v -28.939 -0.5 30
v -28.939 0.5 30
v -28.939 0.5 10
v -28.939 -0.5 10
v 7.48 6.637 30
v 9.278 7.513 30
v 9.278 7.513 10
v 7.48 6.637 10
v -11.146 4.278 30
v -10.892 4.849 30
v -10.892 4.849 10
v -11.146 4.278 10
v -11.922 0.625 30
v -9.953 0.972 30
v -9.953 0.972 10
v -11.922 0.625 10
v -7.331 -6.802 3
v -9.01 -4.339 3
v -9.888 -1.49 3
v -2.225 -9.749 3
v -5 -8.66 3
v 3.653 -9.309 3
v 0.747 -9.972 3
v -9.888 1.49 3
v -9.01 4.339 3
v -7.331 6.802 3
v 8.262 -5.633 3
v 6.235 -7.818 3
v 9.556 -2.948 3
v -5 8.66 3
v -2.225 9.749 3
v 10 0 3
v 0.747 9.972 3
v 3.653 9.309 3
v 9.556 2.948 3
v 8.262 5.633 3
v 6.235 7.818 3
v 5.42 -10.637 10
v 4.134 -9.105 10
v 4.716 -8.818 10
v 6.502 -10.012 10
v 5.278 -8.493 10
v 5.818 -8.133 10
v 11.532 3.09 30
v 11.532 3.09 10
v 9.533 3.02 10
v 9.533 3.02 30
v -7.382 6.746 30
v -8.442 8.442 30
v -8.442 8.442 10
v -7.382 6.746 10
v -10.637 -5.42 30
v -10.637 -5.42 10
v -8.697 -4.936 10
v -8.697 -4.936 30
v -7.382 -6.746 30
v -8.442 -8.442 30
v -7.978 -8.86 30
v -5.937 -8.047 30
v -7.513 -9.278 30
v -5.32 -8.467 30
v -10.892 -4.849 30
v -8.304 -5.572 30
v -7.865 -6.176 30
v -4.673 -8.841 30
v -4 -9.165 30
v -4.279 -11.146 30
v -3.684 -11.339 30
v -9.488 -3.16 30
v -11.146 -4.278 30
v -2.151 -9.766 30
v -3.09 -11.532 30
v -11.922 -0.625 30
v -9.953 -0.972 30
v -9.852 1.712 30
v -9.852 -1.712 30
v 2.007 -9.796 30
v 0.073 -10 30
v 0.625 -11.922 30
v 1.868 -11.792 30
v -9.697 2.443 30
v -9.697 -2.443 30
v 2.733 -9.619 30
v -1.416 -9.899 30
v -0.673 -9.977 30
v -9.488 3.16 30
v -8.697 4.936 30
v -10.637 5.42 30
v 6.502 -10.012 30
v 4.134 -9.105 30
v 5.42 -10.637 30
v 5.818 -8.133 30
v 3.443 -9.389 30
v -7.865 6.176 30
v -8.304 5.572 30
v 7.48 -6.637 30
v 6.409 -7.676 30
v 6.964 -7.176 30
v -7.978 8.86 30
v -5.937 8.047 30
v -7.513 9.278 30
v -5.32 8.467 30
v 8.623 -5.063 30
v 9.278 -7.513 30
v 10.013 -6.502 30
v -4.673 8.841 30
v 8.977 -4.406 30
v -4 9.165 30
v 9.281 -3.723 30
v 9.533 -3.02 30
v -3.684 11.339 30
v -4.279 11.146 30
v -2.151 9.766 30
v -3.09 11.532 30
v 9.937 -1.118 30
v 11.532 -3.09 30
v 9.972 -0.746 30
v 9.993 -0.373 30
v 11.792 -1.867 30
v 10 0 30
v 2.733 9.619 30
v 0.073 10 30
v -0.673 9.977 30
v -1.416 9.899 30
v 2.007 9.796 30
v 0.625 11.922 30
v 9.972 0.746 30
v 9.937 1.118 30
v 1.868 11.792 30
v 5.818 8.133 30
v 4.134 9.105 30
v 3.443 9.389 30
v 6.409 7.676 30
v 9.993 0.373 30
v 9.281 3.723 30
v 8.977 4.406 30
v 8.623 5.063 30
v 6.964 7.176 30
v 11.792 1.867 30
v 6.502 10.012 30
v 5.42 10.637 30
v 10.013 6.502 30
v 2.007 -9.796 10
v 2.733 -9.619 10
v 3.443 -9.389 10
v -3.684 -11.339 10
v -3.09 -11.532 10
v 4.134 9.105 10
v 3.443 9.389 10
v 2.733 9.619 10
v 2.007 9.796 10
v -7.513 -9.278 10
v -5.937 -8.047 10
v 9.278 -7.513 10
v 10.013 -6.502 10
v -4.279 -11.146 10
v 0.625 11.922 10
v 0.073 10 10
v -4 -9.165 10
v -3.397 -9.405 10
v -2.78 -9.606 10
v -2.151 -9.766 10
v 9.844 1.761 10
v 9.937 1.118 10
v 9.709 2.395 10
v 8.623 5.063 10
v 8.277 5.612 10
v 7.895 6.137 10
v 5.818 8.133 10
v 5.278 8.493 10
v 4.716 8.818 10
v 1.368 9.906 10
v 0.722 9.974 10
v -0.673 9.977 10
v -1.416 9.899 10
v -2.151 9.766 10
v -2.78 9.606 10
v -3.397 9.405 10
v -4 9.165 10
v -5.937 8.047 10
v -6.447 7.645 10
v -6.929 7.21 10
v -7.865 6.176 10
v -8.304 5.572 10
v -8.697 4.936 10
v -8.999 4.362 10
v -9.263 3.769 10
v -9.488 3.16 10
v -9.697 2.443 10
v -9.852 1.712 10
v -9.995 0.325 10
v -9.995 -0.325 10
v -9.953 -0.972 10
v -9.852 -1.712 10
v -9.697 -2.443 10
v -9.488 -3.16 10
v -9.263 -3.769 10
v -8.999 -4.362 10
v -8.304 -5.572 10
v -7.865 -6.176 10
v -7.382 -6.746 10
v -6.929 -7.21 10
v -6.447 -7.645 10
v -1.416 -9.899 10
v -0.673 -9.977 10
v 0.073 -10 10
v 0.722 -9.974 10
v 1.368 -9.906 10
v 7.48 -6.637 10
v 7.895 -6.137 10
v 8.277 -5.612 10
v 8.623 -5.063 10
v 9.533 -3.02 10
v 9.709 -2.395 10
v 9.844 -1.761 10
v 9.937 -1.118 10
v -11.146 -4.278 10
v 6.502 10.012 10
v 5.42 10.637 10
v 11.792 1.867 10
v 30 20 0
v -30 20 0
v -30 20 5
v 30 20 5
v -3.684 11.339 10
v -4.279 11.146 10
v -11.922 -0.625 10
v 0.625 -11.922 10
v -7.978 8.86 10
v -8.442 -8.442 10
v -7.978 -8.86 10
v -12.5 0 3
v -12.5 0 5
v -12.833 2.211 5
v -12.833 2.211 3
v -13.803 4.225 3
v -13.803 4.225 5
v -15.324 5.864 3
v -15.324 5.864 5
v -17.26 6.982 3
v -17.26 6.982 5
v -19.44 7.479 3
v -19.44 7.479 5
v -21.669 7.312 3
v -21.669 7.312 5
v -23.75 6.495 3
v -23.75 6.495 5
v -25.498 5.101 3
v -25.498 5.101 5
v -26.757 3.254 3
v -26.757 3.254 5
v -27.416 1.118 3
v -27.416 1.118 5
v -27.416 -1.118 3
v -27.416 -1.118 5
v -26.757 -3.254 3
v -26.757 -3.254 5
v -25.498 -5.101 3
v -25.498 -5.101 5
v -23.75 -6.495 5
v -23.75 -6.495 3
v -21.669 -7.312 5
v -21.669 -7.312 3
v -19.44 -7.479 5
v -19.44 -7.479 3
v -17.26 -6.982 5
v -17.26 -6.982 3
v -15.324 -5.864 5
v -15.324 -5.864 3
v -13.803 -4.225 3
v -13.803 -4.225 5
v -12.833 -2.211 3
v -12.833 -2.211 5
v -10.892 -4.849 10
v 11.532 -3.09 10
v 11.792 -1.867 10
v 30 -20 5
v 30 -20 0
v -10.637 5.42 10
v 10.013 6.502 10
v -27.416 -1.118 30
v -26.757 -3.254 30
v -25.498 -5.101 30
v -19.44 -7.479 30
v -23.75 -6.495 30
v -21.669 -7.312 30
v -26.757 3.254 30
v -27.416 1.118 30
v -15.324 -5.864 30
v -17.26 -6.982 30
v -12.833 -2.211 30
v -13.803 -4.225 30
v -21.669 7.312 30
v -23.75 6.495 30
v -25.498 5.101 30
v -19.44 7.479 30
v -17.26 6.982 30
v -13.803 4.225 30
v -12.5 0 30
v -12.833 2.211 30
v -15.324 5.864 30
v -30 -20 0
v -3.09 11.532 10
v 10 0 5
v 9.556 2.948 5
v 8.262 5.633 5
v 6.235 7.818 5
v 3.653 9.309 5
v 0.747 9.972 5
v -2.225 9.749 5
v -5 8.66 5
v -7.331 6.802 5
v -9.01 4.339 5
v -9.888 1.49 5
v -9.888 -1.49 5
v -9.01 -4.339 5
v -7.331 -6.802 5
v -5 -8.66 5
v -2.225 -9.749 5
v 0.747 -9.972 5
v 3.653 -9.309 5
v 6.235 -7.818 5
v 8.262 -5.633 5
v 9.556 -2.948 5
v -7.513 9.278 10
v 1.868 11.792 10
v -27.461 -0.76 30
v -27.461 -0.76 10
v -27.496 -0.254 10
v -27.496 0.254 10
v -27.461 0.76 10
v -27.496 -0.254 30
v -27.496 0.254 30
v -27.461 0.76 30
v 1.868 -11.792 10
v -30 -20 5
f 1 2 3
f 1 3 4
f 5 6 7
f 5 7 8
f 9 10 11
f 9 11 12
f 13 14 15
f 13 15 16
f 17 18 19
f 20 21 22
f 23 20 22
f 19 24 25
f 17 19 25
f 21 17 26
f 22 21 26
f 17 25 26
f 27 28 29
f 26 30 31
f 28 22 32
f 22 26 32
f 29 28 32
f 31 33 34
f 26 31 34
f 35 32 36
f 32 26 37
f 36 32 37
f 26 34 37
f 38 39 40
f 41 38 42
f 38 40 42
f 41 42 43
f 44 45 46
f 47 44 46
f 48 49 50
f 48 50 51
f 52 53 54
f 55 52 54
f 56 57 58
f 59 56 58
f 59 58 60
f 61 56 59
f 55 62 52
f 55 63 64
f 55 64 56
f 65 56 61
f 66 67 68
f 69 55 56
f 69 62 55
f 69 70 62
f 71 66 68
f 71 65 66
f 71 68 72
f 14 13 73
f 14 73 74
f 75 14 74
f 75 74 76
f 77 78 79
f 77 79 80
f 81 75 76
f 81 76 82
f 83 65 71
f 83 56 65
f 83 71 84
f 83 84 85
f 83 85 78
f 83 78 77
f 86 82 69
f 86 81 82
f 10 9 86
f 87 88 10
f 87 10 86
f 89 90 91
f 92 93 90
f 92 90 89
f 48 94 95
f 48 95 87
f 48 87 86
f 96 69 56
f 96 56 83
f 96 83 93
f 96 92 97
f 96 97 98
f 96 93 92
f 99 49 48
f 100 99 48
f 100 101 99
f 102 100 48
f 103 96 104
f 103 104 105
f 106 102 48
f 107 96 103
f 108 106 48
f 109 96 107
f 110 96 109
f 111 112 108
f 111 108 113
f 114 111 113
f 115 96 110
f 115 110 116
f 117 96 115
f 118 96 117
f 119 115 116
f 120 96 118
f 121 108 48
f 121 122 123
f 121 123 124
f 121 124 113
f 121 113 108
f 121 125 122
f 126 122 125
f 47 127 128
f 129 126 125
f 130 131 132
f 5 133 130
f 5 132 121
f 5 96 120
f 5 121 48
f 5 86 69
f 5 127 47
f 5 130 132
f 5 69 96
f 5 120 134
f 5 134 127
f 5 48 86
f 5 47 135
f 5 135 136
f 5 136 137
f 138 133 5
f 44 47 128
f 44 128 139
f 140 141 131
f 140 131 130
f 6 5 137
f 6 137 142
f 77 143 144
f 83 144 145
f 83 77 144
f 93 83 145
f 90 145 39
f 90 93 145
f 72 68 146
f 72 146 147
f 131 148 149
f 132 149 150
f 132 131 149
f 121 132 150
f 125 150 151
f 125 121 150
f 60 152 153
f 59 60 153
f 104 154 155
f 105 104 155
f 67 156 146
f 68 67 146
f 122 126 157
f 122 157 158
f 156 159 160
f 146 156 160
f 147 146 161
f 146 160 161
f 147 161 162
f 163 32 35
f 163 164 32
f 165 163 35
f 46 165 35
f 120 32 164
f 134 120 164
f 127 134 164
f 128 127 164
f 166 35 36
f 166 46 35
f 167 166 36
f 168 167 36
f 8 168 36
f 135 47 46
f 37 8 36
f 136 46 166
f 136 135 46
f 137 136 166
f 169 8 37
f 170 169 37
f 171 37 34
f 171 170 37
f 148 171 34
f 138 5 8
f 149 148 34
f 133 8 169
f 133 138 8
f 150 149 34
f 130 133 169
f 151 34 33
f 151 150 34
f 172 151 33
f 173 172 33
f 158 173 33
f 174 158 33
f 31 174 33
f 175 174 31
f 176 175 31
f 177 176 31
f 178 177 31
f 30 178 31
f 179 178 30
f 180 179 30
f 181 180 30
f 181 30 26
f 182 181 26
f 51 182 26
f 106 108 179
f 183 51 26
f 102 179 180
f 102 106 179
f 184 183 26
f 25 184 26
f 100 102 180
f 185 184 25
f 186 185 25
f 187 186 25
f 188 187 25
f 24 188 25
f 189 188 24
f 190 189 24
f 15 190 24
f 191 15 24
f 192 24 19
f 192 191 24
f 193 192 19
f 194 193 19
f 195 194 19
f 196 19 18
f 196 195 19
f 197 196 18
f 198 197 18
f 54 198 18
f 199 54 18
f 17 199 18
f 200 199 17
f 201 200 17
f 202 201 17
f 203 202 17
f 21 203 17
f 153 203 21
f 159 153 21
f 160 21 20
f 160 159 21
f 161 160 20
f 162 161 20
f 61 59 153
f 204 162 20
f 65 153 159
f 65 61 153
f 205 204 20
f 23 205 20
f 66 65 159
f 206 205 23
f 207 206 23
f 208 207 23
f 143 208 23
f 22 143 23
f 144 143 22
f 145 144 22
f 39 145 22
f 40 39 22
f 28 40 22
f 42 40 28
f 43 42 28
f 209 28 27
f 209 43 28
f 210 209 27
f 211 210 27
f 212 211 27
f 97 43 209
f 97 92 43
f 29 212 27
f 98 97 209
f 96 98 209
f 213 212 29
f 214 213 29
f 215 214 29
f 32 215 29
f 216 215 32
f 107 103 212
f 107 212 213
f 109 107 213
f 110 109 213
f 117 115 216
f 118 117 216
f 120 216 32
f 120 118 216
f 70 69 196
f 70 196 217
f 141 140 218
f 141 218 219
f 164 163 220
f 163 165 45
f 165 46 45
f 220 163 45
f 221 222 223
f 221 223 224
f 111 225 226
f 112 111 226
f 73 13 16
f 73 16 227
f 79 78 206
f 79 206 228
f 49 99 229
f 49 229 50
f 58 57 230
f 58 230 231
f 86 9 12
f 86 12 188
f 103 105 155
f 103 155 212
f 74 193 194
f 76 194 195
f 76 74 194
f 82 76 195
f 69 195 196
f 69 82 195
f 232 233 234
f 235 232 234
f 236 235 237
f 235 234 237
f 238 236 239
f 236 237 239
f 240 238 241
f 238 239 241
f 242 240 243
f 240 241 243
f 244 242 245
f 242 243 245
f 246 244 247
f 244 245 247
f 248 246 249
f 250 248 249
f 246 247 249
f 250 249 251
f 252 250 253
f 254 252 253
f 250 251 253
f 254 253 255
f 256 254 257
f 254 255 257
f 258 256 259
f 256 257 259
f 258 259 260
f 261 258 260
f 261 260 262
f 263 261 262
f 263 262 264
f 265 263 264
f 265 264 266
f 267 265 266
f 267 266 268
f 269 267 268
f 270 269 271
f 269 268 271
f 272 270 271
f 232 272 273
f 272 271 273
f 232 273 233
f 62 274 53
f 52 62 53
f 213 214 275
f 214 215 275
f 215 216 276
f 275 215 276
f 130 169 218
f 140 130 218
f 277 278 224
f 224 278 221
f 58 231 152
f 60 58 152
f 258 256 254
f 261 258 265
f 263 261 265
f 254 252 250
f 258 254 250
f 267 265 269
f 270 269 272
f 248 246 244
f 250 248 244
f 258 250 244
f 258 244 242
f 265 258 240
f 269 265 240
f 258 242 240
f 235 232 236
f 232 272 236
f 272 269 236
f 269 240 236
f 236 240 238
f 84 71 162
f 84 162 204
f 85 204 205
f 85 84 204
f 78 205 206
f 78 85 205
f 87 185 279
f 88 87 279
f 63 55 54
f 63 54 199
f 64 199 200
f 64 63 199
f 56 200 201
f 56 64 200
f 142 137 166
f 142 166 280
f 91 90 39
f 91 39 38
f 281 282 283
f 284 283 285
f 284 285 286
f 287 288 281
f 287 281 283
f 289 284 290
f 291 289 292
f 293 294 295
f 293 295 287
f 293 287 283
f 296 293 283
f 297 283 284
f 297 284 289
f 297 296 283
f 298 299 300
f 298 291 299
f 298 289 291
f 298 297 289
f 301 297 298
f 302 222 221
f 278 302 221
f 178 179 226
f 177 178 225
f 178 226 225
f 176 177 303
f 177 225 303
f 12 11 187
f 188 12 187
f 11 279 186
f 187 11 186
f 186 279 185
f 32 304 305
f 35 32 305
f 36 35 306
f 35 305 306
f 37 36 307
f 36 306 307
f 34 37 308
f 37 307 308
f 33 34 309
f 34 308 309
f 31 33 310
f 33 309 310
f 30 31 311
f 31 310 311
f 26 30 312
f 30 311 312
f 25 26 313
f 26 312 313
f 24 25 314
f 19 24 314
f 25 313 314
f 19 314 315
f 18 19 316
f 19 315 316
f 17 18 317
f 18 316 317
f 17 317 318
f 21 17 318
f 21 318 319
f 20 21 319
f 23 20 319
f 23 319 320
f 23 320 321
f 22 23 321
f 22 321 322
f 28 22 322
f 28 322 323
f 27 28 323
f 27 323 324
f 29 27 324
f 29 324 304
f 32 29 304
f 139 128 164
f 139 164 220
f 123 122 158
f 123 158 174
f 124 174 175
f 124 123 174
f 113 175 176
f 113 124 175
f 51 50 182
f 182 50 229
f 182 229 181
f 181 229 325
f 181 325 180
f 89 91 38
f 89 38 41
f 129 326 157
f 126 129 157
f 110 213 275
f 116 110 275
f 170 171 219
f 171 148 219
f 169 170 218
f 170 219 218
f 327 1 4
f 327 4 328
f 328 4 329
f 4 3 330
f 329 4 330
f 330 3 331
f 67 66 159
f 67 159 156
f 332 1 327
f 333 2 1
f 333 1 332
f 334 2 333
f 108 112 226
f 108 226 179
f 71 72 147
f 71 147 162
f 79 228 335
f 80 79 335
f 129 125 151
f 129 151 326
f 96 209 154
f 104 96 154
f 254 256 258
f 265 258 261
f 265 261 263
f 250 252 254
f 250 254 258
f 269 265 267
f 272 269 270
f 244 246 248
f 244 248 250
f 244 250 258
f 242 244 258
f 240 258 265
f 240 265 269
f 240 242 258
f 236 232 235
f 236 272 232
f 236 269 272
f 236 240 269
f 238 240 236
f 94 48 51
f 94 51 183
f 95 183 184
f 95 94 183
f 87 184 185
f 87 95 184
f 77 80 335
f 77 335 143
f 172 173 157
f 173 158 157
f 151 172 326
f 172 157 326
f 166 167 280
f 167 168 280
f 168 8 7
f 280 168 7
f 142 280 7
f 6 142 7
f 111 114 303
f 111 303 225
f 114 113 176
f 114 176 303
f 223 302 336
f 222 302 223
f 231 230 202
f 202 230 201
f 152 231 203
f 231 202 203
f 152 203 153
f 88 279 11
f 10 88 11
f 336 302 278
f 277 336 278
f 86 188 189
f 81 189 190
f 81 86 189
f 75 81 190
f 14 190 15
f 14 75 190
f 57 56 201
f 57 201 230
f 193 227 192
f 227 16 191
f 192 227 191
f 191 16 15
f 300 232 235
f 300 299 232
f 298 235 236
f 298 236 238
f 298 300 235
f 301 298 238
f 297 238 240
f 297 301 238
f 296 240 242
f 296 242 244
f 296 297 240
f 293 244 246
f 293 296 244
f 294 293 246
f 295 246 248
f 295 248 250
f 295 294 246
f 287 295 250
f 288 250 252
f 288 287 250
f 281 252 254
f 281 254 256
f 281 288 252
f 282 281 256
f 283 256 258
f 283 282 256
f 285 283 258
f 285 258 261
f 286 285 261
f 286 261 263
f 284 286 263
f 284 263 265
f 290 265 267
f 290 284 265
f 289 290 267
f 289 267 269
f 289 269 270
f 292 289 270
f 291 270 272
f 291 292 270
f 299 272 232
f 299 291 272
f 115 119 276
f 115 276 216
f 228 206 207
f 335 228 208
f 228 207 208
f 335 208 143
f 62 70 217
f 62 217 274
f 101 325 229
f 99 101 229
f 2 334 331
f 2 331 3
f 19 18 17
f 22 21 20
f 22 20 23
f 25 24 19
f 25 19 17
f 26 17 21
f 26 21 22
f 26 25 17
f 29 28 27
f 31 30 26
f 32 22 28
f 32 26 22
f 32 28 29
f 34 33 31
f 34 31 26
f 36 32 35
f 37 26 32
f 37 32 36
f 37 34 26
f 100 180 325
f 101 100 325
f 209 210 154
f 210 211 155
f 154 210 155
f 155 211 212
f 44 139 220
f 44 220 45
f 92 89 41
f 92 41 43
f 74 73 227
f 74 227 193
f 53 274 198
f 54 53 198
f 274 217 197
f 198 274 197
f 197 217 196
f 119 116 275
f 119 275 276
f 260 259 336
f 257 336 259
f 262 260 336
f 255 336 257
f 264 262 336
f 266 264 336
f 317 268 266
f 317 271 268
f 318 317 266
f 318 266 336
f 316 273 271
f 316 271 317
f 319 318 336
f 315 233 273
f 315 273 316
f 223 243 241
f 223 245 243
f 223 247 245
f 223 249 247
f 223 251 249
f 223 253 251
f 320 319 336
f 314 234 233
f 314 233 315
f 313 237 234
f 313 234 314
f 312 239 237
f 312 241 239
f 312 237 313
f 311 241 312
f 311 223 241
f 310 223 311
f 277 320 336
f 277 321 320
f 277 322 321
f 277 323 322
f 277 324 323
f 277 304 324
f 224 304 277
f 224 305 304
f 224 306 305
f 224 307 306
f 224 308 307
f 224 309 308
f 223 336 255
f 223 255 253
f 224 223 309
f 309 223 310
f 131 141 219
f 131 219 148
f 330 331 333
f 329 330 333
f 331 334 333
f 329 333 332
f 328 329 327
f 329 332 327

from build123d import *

# Parameters (mm, degrees)
F0_W          = 60
F0_H          = 40
F1_DEPTH      = 5
F2_R          = 7.5
F3_DEPTH      = 25
F3_DEPTH_BACK = 2
F5_R          = 10
F6_DEPTH      = 25
F6_DEPTH_BACK = 2
F9_DEPTH      = 20
F12_DEPTH     = 20


with BuildPart() as f1:
    # F0 (on Top) → F1 (new body)
    with BuildSketch(Plane.XY):
        Rectangle(F0_W, F0_H)
    extrude(amount=F1_DEPTH)


with BuildPart() as f3:
    # F2 (on face) → F3 (new body, two sides)
    with BuildSketch(Plane.XY.offset(5)) as f3_sk:
        with Locations((-20, 0)):
            Circle(F2_R)
    extrude(amount=F3_DEPTH)
    extrude(f3_sk.sketch, amount=-F3_DEPTH_BACK)


with BuildPart() as f1_1:
    add(f1.part)

    # F4: cut F3
    add(f3.part, mode=Mode.SUBTRACT)


with BuildPart() as f6:
    # F5 (on face) → F6 (new body, two sides)
    with BuildSketch(Plane.XY.offset(5)) as f6_sk:
        Circle(F5_R)
    extrude(amount=F6_DEPTH)
    extrude(f6_sk.sketch, amount=-F6_DEPTH_BACK)

    # F11 (on face) → F12 (join)
    with BuildSketch(Plane.XY.offset(30)):
        with BuildLine():
            ThreePointArc((9.937283, -1.118217), (9.984308, -0.559987), (10, 0))
            ThreePointArc((10, 0), (9.984308, 0.559987), (9.937283, 1.118217))
            ThreePointArc((9.937283, 1.118217), (9.781476, 2.079117), (9.532979, 3.020315))
            ThreePointArc((9.532979, 3.020315), (9.135455, 4.067366), (8.62334, 5.063399))
            ThreePointArc((8.62334, 5.063399), (8.09017, 5.877853), (7.480337, 6.636607))
            ThreePointArc((7.480337, 6.636607), (6.691306, 7.431448), (5.818343, 8.133073))
            ThreePointArc((5.818343, 8.133073), (5, 8.660254), (4.134277, 9.10537))
            ThreePointArc((4.134277, 9.10537), (3.09017, 9.510565), (2.007302, 9.796466))
            ThreePointArc((2.007302, 9.796466), (1.045285, 9.945219), (0.073362, 9.999731))
            ThreePointArc((0.073362, 9.999731), (-1.045285, 9.945219), (-2.15082, 9.76596))
            ThreePointArc((-2.15082, 9.76596), (-3.09017, 9.510565), (-4.000237, 9.165048))
            ThreePointArc((-4.000237, 9.165048), (-5, 8.660254), (-5.937045, 8.046831))
            ThreePointArc((-5.937045, 8.046831), (-6.691306, 7.431448), (-7.382159, 6.745645))
            ThreePointArc((-7.382159, 6.745645), (-8.09017, 5.877853), (-8.696702, 4.936332))
            ThreePointArc((-8.696702, 4.936332), (-9.135455, 4.067366), (-9.487639, 3.159858))
            ThreePointArc((-9.487639, 3.159858), (-9.781476, 2.079117), (-9.95262, 0.972296))
            ThreePointArc((-9.95262, 0.972296), (-10, 0), (-9.95262, -0.972296))
            ThreePointArc((-9.95262, -0.972296), (-9.781476, -2.079117), (-9.487639, -3.159858))
            ThreePointArc((-9.487639, -3.159858), (-9.135455, -4.067366), (-8.696702, -4.936332))
            ThreePointArc((-8.696702, -4.936332), (-8.09017, -5.877853), (-7.382159, -6.745645))
            ThreePointArc((-7.382159, -6.745645), (-6.691306, -7.431448), (-5.937045, -8.046831))
            ThreePointArc((-5.937045, -8.046831), (-5, -8.660254), (-4.000237, -9.165048))
            ThreePointArc((-4.000237, -9.165048), (-3.09017, -9.510565), (-2.15082, -9.76596))
            ThreePointArc((-2.15082, -9.76596), (-1.045285, -9.945219), (0.073362, -9.999731))
            ThreePointArc((0.073362, -9.999731), (1.045285, -9.945219), (2.007302, -9.796466))
            ThreePointArc((2.007302, -9.796466), (3.09017, -9.510565), (4.134277, -9.10537))
            ThreePointArc((4.134277, -9.10537), (5, -8.660254), (5.818343, -8.133073))
            ThreePointArc((5.818343, -8.133073), (6.691306, -7.431448), (7.480337, -6.636607))
            ThreePointArc((7.480337, -6.636607), (8.09017, -5.877853), (8.62334, -5.063399))
            ThreePointArc((8.62334, -5.063399), (9.135455, -4.067366), (9.532979, -3.020315))
            ThreePointArc((9.532979, -3.020315), (9.781476, -2.079117), (9.937283, -1.118217))
        make_face()
        with BuildLine():
            ThreePointArc((9.532979, 3.020315), (9.781476, 2.079117), (9.937283, 1.118217))
            Line((9.937283, 1.118217), (11.791651, 1.86743))
            Line((11.791651, 1.86743), (11.661706, 2.478772))
            Line((11.661706, 2.478772), (11.531761, 3.090114))
            Line((11.531761, 3.090114), (9.532979, 3.020315))
        make_face()
        with BuildLine():
            Line((11.791651, -1.86743), (9.937283, -1.118217))
            ThreePointArc((9.937283, -1.118217), (9.781476, -2.079117), (9.532979, -3.020315))
            Line((9.532979, -3.020315), (11.531761, -3.090114))
            Line((11.531761, -3.090114), (11.661706, -2.478772))
            Line((11.661706, -2.478772), (11.791651, -1.86743))
        make_face()
        with BuildLine():
            ThreePointArc((7.480337, 6.636607), (8.09017, 5.877853), (8.62334, 5.063399))
            Line((8.62334, 5.063399), (10.012657, 6.502078))
            Line((10.012657, 6.502078), (9.645291, 7.007714))
            Line((9.645291, 7.007714), (9.277925, 7.51335))
            Line((9.277925, 7.51335), (7.480337, 6.636607))
        make_face()
        with BuildLine():
            Line((10.012657, -6.502078), (8.62334, -5.063399))
            ThreePointArc((8.62334, -5.063399), (8.09017, -5.877853), (7.480337, -6.636607))
            Line((7.480337, -6.636607), (9.277925, -7.51335))
            Line((9.277925, -7.51335), (9.645291, -7.007714))
            Line((9.645291, -7.007714), (10.012657, -6.502078))
        make_face()
        with BuildLine():
            ThreePointArc((4.134277, 9.10537), (5, 8.660254), (5.818343, 8.133073))
            Line((5.818343, 8.133073), (6.502384, 10.012459))
            Line((6.502384, 10.012459), (5.961118, 10.324959))
            Line((5.961118, 10.324959), (5.419852, 10.637459))
            Line((5.419852, 10.637459), (4.134277, 9.10537))
        make_face()
        with BuildLine():
            Line((6.502384, -10.012459), (5.818343, -8.133073))
            ThreePointArc((5.818343, -8.133073), (5, -8.660254), (4.134277, -9.10537))
            Line((4.134277, -9.10537), (5.419852, -10.637459))
            Line((5.419852, -10.637459), (5.961118, -10.324959))
            Line((5.961118, -10.324959), (6.502384, -10.012459))
        make_face()
        with BuildLine():
            ThreePointArc((0.073362, 9.999731), (1.045285, 9.945219), (2.007302, 9.796466))
            Line((2.007302, 9.796466), (1.867789, 11.791594))
            Line((1.867789, 11.791594), (1.246213, 11.856924))
            Line((1.246213, 11.856924), (0.624637, 11.922254))
            Line((0.624637, 11.922254), (0.073362, 9.999731))
        make_face()
        with BuildLine():
            Line((1.867789, -11.791594), (2.007302, -9.796466))
            ThreePointArc((2.007302, -9.796466), (1.045285, -9.945219), (0.073362, -9.999731))
            Line((0.073362, -9.999731), (0.624637, -11.922254))
            Line((0.624637, -11.922254), (1.246213, -11.856924))
            Line((1.246213, -11.856924), (1.867789, -11.791594))
        make_face()
        with BuildLine():
            ThreePointArc((-4.000237, 9.165048), (-3.09017, 9.510565), (-2.15082, 9.76596))
            Line((-2.15082, 9.76596), (-3.089763, 11.531855))
            Line((-3.089763, 11.531855), (-3.684173, 11.33872))
            Line((-3.684173, 11.33872), (-4.278584, 11.145584))
            Line((-4.278584, 11.145584), (-4.000237, 9.165048))
        make_face()
        with BuildLine():
            Line((-3.089763, -11.531855), (-2.15082, -9.76596))
            ThreePointArc((-2.15082, -9.76596), (-3.09017, -9.510565), (-4.000237, -9.165048))
            Line((-4.000237, -9.165048), (-4.278584, -11.145584))
            Line((-4.278584, -11.145584), (-3.684173, -11.33872))
            Line((-3.684173, -11.33872), (-3.089763, -11.531855))
        make_face()
        with BuildLine():
            ThreePointArc((-7.382159, 6.745645), (-6.691306, 7.431448), (-5.937045, 8.046831))
            Line((-5.937045, 8.046831), (-7.513067, 9.278154))
            Line((-7.513067, 9.278154), (-7.977533, 8.859947))
            Line((-7.977533, 8.859947), (-8.441998, 8.441741))
            Line((-8.441998, 8.441741), (-7.382159, 6.745645))
        make_face()
        with BuildLine():
            Line((-7.513067, -9.278154), (-5.937045, -8.046831))
            ThreePointArc((-5.937045, -8.046831), (-6.691306, -7.431448), (-7.382159, -6.745645))
            Line((-7.382159, -6.745645), (-8.441998, -8.441741))
            Line((-8.441998, -8.441741), (-7.977533, -8.859947))
            Line((-7.977533, -8.859947), (-7.513067, -9.278154))
        make_face()
        with BuildLine():
            ThreePointArc((-9.487639, 3.159858), (-9.135455, 4.067366), (-8.696702, 4.936332))
            Line((-8.696702, 4.936332), (-10.637293, 5.420176))
            Line((-10.637293, 5.420176), (-10.891504, 4.84921))
            Line((-10.891504, 4.84921), (-11.145714, 4.278244))
            Line((-11.145714, 4.278244), (-9.487639, 3.159858))
        make_face()
        with BuildLine():
            Line((-10.637293, -5.420176), (-8.696702, -4.936332))
            ThreePointArc((-8.696702, -4.936332), (-9.135455, -4.067366), (-9.487639, -3.159858))
            Line((-9.487639, -3.159858), (-11.145714, -4.278244))
            Line((-11.145714, -4.278244), (-10.891504, -4.84921))
            Line((-10.891504, -4.84921), (-10.637293, -5.420176))
        make_face()
        with BuildLine():
            ThreePointArc((-9.95262, -0.972296), (-10, 0), (-9.95262, 0.972296))
            Line((-9.95262, 0.972296), (-11.922235, 0.625))
            Line((-11.922235, 0.625), (-11.922235, 0))
            Line((-11.922235, 0), (-11.922235, -0.625))
            Line((-11.922235, -0.625), (-9.95262, -0.972296))
        make_face()
    extrude(amount=-F12_DEPTH)


with BuildPart() as f1_2:
    add(f1_1.part)

    # F7: cut F6
    add(f6.part, mode=Mode.SUBTRACT)


with BuildPart() as f9:
    # F8 (on face) → F9 (new body)
    with BuildSketch(Plane.XY.offset(30)):
        with BuildLine():
            ThreePointArc((-27.461346, -0.760472), (-27.5, 0), (-27.461346, 0.760472))
            Line((-27.461346, 0.760472), (-28.938557, 0.5))
            Line((-28.938557, 0.5), (-28.938557, 0))
            Line((-28.938557, 0), (-28.938557, -0.5))
            Line((-28.938557, -0.5), (-27.461346, -0.760472))
        make_face()
        with BuildLine():
            ThreePointArc((-12.5, 0), (-19.619273, 7.49033), (-27.461346, 0.760472))
            ThreePointArc((-27.461346, 0.760472), (-27.5, 0), (-27.461346, -0.760472))
            ThreePointArc((-27.461346, -0.760472), (-19.619273, -7.49033), (-12.5, 0))
        make_face()
    extrude(amount=-F9_DEPTH)

    # F10: cut F3
    add(f3.part, mode=Mode.SUBTRACT)


solid = Compound([f3.part, f6.part, f1_2.part, f9.part])
